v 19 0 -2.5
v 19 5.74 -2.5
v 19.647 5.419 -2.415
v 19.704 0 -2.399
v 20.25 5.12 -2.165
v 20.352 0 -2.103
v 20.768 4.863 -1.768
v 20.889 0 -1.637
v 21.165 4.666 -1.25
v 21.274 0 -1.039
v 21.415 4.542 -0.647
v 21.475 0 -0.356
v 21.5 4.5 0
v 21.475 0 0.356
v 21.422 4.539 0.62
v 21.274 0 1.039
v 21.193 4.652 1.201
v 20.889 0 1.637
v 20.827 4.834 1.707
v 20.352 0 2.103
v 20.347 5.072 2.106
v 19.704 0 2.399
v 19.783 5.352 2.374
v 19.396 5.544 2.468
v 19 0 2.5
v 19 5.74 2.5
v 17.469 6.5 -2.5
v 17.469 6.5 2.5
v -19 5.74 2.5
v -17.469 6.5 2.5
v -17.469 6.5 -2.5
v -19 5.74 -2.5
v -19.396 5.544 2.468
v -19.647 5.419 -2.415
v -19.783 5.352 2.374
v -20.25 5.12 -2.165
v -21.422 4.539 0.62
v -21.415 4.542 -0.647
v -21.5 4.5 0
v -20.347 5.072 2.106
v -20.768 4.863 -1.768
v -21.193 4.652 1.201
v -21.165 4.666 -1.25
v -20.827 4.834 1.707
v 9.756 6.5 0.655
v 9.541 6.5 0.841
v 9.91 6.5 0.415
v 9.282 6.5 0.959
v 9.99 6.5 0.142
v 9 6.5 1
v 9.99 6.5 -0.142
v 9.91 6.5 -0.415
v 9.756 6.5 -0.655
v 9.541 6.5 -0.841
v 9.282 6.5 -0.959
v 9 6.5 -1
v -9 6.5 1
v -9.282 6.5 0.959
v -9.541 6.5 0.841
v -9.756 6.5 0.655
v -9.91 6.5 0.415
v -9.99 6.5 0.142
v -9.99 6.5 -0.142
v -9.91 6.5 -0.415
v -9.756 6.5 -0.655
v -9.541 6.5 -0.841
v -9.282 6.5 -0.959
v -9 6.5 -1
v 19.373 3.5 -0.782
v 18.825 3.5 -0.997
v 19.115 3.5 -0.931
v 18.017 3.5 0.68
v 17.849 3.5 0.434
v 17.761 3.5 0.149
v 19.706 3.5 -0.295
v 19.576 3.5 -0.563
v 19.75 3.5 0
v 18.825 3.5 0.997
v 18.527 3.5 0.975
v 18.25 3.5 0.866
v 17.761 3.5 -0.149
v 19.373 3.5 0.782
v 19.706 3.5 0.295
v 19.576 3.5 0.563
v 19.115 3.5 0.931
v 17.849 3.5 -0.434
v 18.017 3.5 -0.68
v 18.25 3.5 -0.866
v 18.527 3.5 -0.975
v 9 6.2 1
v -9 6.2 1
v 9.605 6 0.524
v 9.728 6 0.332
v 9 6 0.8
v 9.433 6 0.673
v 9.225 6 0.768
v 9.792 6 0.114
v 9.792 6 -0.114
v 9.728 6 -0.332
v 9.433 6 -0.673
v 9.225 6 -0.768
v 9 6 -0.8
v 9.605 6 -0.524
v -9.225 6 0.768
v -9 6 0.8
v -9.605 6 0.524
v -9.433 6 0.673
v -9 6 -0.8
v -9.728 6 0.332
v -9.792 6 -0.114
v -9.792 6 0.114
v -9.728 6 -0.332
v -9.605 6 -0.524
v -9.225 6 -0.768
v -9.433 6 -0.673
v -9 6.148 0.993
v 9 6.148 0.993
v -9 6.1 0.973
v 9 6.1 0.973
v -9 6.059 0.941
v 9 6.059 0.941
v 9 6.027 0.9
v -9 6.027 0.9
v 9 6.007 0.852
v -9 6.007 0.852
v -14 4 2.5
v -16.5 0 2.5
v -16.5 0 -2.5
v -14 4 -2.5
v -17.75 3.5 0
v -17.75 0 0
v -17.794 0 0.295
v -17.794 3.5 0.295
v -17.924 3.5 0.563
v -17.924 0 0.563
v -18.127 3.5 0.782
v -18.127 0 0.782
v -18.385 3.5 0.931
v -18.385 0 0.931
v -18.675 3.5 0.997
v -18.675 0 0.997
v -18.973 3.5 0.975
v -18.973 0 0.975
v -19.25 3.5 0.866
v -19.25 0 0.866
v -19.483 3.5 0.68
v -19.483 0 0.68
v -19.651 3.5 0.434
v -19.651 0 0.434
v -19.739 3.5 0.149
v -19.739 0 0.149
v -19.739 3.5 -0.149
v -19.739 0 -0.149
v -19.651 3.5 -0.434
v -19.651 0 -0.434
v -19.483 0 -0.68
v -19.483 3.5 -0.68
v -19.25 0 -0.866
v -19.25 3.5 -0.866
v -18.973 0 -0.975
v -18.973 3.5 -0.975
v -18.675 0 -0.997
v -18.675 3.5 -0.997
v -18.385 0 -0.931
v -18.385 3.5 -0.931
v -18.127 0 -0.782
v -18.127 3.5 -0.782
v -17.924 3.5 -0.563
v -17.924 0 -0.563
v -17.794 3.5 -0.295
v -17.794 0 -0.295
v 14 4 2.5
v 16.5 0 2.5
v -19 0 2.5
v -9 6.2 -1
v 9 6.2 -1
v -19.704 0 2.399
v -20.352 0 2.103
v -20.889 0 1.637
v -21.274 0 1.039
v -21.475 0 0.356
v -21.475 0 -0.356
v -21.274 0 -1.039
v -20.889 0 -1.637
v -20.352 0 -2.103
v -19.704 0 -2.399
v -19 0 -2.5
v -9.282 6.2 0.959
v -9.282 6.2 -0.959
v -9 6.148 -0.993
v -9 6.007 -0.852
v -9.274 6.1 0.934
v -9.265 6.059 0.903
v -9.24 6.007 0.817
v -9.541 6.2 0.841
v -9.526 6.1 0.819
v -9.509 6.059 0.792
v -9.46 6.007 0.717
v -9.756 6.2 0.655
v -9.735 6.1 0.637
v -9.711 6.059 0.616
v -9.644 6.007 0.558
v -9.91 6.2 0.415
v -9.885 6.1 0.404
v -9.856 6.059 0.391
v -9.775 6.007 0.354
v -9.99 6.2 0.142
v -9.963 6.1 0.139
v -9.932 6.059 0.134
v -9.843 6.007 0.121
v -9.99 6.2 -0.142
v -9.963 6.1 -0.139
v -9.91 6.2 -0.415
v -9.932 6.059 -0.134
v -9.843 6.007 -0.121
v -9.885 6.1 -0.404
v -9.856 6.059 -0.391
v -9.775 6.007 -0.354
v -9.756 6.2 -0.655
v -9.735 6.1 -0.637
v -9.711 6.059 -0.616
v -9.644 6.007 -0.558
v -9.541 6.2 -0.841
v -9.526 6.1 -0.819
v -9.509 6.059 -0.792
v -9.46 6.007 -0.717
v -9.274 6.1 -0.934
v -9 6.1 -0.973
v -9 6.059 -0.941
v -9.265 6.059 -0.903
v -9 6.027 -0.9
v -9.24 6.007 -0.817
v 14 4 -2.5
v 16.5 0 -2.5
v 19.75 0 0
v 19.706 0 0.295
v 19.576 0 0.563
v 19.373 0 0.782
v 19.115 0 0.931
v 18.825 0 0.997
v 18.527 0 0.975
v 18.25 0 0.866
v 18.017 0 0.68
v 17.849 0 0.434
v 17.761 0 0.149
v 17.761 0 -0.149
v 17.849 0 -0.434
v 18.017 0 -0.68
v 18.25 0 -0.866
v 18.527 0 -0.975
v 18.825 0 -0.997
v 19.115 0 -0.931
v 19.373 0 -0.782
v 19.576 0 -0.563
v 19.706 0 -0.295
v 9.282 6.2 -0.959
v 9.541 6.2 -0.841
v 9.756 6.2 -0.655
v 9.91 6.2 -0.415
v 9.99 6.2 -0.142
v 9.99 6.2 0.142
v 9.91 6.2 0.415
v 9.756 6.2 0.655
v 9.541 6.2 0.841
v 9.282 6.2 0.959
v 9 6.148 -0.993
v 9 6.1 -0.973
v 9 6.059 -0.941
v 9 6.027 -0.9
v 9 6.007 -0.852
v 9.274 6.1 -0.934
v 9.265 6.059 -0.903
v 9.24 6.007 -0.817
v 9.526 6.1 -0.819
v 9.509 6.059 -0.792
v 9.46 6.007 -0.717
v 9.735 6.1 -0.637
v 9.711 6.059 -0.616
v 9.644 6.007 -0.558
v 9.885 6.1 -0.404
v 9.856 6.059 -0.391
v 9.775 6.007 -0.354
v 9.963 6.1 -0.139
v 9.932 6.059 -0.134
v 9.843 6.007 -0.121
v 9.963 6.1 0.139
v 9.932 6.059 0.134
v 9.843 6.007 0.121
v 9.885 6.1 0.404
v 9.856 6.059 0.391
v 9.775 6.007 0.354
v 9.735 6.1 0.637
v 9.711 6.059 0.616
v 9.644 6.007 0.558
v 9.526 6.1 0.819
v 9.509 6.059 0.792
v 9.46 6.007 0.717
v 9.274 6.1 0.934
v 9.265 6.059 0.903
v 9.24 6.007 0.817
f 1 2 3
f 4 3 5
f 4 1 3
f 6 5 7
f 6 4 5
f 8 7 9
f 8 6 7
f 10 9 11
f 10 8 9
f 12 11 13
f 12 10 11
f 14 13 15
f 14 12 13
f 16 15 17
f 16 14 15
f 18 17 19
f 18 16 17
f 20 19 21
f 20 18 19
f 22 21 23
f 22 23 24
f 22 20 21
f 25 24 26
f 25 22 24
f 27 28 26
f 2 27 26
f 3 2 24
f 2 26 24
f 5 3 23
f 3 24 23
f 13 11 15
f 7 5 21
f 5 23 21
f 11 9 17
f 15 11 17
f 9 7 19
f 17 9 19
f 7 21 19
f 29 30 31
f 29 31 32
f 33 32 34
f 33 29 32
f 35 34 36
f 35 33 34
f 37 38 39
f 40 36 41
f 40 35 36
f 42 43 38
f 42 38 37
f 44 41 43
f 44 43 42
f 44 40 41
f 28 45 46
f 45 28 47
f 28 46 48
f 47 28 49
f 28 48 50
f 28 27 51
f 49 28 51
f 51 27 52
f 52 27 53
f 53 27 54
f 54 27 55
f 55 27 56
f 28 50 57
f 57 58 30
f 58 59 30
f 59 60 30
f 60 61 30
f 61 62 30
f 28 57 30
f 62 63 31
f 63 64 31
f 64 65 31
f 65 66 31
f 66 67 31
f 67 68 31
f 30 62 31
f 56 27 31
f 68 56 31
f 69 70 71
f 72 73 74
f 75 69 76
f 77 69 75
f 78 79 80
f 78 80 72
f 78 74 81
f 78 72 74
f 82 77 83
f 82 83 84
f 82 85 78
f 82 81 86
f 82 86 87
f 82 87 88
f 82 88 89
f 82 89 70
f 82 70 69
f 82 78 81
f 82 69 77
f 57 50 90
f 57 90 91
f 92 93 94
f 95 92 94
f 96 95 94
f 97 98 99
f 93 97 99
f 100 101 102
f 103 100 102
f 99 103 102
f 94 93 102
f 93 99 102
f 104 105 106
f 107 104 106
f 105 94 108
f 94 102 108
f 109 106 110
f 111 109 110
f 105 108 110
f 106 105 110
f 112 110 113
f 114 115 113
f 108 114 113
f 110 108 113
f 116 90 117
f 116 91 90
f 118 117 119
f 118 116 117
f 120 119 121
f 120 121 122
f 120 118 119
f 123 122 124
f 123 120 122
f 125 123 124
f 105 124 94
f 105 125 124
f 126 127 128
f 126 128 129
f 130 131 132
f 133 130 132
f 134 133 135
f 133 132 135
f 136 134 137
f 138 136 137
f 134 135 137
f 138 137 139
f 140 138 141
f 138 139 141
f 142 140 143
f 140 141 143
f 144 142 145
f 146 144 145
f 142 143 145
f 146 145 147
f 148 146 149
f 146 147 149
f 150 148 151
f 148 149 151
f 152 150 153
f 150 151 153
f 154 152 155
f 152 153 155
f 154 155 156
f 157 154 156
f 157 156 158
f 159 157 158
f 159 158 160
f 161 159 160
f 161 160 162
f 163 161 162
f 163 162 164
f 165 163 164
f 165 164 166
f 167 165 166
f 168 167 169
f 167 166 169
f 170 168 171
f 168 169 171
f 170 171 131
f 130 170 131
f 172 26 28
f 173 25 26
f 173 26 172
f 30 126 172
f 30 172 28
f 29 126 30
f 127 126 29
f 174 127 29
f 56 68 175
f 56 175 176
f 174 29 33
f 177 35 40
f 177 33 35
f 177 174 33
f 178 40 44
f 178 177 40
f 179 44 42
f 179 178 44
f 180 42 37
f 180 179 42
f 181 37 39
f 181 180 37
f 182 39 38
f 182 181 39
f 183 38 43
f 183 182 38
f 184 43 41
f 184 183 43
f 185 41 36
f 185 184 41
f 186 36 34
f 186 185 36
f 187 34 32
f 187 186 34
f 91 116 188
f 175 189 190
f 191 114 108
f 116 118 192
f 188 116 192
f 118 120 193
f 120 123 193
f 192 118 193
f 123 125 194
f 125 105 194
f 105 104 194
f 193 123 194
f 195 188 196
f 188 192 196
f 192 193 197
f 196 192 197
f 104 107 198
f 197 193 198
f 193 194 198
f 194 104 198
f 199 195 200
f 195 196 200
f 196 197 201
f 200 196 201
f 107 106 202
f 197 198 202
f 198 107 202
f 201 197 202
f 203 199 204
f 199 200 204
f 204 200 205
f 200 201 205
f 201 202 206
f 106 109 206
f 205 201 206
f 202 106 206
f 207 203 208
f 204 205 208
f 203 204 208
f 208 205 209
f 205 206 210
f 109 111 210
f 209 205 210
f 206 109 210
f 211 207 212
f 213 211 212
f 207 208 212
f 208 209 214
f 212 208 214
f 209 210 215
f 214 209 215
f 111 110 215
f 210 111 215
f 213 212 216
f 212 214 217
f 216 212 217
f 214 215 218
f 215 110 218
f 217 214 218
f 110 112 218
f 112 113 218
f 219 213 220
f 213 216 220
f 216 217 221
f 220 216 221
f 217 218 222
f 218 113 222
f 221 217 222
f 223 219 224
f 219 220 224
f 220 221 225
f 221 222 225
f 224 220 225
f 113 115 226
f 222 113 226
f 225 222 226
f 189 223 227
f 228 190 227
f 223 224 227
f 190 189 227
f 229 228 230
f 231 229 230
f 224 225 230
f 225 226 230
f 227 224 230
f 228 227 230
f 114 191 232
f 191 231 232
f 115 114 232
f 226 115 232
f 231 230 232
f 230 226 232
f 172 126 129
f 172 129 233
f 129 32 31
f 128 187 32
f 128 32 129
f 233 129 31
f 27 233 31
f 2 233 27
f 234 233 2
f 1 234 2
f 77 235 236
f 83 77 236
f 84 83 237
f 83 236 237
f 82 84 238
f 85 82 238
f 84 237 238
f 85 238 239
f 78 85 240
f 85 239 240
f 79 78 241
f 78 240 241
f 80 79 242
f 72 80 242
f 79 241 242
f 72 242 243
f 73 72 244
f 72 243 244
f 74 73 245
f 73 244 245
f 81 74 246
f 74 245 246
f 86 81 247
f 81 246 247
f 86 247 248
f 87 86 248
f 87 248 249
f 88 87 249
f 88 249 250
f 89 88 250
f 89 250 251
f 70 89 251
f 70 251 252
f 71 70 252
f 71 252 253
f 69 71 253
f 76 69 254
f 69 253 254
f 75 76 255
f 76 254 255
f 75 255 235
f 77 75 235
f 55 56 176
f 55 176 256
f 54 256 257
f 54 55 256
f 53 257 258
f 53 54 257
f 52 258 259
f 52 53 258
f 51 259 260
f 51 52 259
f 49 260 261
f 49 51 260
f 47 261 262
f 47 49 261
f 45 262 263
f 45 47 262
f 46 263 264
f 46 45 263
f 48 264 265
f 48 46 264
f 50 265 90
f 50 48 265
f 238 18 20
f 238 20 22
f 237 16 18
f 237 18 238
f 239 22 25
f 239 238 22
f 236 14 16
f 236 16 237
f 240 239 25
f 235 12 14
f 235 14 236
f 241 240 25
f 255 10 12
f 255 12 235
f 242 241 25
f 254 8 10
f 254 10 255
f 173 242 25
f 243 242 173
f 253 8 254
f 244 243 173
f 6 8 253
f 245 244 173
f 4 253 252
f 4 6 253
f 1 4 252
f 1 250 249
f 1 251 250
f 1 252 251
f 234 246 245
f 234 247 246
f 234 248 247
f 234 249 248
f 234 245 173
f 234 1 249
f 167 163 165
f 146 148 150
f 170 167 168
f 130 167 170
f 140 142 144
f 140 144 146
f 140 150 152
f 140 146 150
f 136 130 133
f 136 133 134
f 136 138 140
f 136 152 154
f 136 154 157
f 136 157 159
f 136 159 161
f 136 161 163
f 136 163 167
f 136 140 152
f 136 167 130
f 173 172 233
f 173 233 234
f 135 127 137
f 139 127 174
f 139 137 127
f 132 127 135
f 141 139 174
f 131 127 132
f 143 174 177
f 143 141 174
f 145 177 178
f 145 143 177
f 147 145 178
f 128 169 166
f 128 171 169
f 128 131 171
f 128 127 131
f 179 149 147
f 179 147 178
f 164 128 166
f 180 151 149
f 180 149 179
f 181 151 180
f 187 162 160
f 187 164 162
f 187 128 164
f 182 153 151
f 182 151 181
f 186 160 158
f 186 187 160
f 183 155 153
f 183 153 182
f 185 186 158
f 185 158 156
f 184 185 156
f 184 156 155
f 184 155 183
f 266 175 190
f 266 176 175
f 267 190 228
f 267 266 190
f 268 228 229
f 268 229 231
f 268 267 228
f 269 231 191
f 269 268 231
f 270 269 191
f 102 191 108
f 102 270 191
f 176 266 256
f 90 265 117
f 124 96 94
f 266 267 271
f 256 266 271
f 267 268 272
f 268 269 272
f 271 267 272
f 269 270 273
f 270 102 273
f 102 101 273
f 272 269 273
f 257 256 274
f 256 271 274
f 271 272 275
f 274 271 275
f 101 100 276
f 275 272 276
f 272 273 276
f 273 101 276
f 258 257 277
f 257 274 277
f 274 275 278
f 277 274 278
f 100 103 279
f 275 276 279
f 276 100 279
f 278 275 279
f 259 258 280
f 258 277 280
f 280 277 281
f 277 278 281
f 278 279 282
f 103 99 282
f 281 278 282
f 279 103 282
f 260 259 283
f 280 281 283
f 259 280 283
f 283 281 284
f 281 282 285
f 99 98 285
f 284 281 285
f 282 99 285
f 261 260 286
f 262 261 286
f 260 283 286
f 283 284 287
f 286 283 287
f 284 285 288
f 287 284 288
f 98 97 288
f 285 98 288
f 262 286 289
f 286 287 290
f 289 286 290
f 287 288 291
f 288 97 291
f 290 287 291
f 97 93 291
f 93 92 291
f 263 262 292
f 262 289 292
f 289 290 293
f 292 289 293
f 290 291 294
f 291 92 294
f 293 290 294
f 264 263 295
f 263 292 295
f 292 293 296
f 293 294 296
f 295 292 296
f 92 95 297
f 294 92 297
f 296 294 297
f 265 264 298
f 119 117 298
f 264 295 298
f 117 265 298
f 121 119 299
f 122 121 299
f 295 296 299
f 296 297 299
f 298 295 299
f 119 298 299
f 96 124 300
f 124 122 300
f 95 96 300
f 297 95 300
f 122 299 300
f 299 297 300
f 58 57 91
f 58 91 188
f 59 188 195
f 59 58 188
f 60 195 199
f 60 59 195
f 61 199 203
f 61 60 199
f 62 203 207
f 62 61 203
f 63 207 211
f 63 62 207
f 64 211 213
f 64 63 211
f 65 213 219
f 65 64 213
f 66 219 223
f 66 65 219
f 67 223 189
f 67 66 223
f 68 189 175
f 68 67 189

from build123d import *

# Parameters (mm, degrees)
EXTRUDE_1_DEPTH     = 6.5
CUT_EXTRUDE_1_REACH = 7
SKETCH_3_R          = 1
CUT_EXTRUDE_2_DEPTH = 3.5
CUT_EXTRUDE_3_DEPTH = 0.5
FILLET_1_R          = 0.2


with BuildPart() as part:
    # 草图1 → 凸台-拉伸1 (new body)
    with BuildSketch(Plane(origin=(0, 0, 0), x_dir=(1, 0, 0), z_dir=(0, 1, 0))):
        with BuildLine():
            Line((-19, 2.5), (19, 2.5))
            ThreePointArc((19, 2.5), (21.5, 0), (19, -2.5))
            Line((19, -2.5), (-19, -2.5))
            ThreePointArc((-19, -2.5), (-21.5, 0), (-19, 2.5))
        make_face()
    extrude(amount=EXTRUDE_1_DEPTH)

    # 草图2 → 切除-拉伸1 (cut, up to next)
    with BuildSketch(Plane.XY.offset(2.5), mode=Mode.PRIVATE) as cut_extrude_1_sk1:
        Polygon((17.468871126, 6.5), (21.5, 4.5), (21.5, 7.438332244), (17.468871126, 7.438332244), align=None)
    cut_extrude_1_tool1 = extrude(cut_extrude_1_sk1.sketch, amount=-CUT_EXTRUDE_1_REACH, mode=Mode.PRIVATE) & part.part
    add(cut_extrude_1_tool1.solids().sort_by_distance((19.83105, 6.383182, 2.5))[0], mode=Mode.SUBTRACT)
    # 草图2 → 切除-拉伸1 (cut, up to next)
    with BuildSketch(Plane.XY.offset(2.5), mode=Mode.PRIVATE) as cut_extrude_1_sk2:
        Polygon((14, 4), (16.5, 0), (16.5, -3.02965668), (-16.5, -3.02965668), (-16.5, 0), (-14, 4), align=None)
    cut_extrude_1_tool2 = extrude(cut_extrude_1_sk2.sketch, amount=-CUT_EXTRUDE_1_REACH, mode=Mode.PRIVATE) & part.part
    add(cut_extrude_1_tool2.solids().sort_by_distance((0, 0.386897, 2.5))[0], mode=Mode.SUBTRACT)
    # 草图2 → 切除-拉伸1 (cut, up to next)
    with BuildSketch(Plane.XY.offset(2.5), mode=Mode.PRIVATE) as cut_extrude_1_sk3:
        Polygon((-21.5, 7.438332244), (-17.468871126, 7.438332244), (-17.468871126, 6.5), (-21.5, 4.5), align=None)
    cut_extrude_1_tool3 = extrude(cut_extrude_1_sk3.sketch, amount=-CUT_EXTRUDE_1_REACH, mode=Mode.PRIVATE) & part.part
    add(cut_extrude_1_tool3.solids().sort_by_distance((-19.83105, 6.383182, 2.5))[0], mode=Mode.SUBTRACT)

    # 草图3 → 切除-拉伸2 (cut)
    with BuildSketch(Plane.XZ):
        with Locations((18.75, 0)):
            Circle(SKETCH_3_R)
        with Locations((-18.75, 0)):
            Circle(SKETCH_3_R)
    extrude(amount=-CUT_EXTRUDE_2_DEPTH, mode=Mode.SUBTRACT)

    # 草图4 → 切除-拉伸3 (cut)
    with BuildSketch(Plane(origin=(0, 6.5, 0), x_dir=(1, 0, 0), z_dir=(0, 1, 0))):
        with BuildLine():
            Line((-9, 1), (9, 1))
            ThreePointArc((9, 1), (10, 0), (9, -1))
            Line((9, -1), (-9, -1))
            ThreePointArc((-9, -1), (-10, 0), (-9, 1))
        make_face()
    extrude(amount=-CUT_EXTRUDE_3_DEPTH, mode=Mode.SUBTRACT)

    # 圆角1
    fillet_1_edges = [part.edges().sort_by_distance(p)[0] for p in [
        (-10, 6, 0),
        (0, 6, -1),
        (10, 6, 0),
        (0, 6, 1),
    ]]
    fillet(fillet_1_edges, radius=FILLET_1_R)


solid = part.part
